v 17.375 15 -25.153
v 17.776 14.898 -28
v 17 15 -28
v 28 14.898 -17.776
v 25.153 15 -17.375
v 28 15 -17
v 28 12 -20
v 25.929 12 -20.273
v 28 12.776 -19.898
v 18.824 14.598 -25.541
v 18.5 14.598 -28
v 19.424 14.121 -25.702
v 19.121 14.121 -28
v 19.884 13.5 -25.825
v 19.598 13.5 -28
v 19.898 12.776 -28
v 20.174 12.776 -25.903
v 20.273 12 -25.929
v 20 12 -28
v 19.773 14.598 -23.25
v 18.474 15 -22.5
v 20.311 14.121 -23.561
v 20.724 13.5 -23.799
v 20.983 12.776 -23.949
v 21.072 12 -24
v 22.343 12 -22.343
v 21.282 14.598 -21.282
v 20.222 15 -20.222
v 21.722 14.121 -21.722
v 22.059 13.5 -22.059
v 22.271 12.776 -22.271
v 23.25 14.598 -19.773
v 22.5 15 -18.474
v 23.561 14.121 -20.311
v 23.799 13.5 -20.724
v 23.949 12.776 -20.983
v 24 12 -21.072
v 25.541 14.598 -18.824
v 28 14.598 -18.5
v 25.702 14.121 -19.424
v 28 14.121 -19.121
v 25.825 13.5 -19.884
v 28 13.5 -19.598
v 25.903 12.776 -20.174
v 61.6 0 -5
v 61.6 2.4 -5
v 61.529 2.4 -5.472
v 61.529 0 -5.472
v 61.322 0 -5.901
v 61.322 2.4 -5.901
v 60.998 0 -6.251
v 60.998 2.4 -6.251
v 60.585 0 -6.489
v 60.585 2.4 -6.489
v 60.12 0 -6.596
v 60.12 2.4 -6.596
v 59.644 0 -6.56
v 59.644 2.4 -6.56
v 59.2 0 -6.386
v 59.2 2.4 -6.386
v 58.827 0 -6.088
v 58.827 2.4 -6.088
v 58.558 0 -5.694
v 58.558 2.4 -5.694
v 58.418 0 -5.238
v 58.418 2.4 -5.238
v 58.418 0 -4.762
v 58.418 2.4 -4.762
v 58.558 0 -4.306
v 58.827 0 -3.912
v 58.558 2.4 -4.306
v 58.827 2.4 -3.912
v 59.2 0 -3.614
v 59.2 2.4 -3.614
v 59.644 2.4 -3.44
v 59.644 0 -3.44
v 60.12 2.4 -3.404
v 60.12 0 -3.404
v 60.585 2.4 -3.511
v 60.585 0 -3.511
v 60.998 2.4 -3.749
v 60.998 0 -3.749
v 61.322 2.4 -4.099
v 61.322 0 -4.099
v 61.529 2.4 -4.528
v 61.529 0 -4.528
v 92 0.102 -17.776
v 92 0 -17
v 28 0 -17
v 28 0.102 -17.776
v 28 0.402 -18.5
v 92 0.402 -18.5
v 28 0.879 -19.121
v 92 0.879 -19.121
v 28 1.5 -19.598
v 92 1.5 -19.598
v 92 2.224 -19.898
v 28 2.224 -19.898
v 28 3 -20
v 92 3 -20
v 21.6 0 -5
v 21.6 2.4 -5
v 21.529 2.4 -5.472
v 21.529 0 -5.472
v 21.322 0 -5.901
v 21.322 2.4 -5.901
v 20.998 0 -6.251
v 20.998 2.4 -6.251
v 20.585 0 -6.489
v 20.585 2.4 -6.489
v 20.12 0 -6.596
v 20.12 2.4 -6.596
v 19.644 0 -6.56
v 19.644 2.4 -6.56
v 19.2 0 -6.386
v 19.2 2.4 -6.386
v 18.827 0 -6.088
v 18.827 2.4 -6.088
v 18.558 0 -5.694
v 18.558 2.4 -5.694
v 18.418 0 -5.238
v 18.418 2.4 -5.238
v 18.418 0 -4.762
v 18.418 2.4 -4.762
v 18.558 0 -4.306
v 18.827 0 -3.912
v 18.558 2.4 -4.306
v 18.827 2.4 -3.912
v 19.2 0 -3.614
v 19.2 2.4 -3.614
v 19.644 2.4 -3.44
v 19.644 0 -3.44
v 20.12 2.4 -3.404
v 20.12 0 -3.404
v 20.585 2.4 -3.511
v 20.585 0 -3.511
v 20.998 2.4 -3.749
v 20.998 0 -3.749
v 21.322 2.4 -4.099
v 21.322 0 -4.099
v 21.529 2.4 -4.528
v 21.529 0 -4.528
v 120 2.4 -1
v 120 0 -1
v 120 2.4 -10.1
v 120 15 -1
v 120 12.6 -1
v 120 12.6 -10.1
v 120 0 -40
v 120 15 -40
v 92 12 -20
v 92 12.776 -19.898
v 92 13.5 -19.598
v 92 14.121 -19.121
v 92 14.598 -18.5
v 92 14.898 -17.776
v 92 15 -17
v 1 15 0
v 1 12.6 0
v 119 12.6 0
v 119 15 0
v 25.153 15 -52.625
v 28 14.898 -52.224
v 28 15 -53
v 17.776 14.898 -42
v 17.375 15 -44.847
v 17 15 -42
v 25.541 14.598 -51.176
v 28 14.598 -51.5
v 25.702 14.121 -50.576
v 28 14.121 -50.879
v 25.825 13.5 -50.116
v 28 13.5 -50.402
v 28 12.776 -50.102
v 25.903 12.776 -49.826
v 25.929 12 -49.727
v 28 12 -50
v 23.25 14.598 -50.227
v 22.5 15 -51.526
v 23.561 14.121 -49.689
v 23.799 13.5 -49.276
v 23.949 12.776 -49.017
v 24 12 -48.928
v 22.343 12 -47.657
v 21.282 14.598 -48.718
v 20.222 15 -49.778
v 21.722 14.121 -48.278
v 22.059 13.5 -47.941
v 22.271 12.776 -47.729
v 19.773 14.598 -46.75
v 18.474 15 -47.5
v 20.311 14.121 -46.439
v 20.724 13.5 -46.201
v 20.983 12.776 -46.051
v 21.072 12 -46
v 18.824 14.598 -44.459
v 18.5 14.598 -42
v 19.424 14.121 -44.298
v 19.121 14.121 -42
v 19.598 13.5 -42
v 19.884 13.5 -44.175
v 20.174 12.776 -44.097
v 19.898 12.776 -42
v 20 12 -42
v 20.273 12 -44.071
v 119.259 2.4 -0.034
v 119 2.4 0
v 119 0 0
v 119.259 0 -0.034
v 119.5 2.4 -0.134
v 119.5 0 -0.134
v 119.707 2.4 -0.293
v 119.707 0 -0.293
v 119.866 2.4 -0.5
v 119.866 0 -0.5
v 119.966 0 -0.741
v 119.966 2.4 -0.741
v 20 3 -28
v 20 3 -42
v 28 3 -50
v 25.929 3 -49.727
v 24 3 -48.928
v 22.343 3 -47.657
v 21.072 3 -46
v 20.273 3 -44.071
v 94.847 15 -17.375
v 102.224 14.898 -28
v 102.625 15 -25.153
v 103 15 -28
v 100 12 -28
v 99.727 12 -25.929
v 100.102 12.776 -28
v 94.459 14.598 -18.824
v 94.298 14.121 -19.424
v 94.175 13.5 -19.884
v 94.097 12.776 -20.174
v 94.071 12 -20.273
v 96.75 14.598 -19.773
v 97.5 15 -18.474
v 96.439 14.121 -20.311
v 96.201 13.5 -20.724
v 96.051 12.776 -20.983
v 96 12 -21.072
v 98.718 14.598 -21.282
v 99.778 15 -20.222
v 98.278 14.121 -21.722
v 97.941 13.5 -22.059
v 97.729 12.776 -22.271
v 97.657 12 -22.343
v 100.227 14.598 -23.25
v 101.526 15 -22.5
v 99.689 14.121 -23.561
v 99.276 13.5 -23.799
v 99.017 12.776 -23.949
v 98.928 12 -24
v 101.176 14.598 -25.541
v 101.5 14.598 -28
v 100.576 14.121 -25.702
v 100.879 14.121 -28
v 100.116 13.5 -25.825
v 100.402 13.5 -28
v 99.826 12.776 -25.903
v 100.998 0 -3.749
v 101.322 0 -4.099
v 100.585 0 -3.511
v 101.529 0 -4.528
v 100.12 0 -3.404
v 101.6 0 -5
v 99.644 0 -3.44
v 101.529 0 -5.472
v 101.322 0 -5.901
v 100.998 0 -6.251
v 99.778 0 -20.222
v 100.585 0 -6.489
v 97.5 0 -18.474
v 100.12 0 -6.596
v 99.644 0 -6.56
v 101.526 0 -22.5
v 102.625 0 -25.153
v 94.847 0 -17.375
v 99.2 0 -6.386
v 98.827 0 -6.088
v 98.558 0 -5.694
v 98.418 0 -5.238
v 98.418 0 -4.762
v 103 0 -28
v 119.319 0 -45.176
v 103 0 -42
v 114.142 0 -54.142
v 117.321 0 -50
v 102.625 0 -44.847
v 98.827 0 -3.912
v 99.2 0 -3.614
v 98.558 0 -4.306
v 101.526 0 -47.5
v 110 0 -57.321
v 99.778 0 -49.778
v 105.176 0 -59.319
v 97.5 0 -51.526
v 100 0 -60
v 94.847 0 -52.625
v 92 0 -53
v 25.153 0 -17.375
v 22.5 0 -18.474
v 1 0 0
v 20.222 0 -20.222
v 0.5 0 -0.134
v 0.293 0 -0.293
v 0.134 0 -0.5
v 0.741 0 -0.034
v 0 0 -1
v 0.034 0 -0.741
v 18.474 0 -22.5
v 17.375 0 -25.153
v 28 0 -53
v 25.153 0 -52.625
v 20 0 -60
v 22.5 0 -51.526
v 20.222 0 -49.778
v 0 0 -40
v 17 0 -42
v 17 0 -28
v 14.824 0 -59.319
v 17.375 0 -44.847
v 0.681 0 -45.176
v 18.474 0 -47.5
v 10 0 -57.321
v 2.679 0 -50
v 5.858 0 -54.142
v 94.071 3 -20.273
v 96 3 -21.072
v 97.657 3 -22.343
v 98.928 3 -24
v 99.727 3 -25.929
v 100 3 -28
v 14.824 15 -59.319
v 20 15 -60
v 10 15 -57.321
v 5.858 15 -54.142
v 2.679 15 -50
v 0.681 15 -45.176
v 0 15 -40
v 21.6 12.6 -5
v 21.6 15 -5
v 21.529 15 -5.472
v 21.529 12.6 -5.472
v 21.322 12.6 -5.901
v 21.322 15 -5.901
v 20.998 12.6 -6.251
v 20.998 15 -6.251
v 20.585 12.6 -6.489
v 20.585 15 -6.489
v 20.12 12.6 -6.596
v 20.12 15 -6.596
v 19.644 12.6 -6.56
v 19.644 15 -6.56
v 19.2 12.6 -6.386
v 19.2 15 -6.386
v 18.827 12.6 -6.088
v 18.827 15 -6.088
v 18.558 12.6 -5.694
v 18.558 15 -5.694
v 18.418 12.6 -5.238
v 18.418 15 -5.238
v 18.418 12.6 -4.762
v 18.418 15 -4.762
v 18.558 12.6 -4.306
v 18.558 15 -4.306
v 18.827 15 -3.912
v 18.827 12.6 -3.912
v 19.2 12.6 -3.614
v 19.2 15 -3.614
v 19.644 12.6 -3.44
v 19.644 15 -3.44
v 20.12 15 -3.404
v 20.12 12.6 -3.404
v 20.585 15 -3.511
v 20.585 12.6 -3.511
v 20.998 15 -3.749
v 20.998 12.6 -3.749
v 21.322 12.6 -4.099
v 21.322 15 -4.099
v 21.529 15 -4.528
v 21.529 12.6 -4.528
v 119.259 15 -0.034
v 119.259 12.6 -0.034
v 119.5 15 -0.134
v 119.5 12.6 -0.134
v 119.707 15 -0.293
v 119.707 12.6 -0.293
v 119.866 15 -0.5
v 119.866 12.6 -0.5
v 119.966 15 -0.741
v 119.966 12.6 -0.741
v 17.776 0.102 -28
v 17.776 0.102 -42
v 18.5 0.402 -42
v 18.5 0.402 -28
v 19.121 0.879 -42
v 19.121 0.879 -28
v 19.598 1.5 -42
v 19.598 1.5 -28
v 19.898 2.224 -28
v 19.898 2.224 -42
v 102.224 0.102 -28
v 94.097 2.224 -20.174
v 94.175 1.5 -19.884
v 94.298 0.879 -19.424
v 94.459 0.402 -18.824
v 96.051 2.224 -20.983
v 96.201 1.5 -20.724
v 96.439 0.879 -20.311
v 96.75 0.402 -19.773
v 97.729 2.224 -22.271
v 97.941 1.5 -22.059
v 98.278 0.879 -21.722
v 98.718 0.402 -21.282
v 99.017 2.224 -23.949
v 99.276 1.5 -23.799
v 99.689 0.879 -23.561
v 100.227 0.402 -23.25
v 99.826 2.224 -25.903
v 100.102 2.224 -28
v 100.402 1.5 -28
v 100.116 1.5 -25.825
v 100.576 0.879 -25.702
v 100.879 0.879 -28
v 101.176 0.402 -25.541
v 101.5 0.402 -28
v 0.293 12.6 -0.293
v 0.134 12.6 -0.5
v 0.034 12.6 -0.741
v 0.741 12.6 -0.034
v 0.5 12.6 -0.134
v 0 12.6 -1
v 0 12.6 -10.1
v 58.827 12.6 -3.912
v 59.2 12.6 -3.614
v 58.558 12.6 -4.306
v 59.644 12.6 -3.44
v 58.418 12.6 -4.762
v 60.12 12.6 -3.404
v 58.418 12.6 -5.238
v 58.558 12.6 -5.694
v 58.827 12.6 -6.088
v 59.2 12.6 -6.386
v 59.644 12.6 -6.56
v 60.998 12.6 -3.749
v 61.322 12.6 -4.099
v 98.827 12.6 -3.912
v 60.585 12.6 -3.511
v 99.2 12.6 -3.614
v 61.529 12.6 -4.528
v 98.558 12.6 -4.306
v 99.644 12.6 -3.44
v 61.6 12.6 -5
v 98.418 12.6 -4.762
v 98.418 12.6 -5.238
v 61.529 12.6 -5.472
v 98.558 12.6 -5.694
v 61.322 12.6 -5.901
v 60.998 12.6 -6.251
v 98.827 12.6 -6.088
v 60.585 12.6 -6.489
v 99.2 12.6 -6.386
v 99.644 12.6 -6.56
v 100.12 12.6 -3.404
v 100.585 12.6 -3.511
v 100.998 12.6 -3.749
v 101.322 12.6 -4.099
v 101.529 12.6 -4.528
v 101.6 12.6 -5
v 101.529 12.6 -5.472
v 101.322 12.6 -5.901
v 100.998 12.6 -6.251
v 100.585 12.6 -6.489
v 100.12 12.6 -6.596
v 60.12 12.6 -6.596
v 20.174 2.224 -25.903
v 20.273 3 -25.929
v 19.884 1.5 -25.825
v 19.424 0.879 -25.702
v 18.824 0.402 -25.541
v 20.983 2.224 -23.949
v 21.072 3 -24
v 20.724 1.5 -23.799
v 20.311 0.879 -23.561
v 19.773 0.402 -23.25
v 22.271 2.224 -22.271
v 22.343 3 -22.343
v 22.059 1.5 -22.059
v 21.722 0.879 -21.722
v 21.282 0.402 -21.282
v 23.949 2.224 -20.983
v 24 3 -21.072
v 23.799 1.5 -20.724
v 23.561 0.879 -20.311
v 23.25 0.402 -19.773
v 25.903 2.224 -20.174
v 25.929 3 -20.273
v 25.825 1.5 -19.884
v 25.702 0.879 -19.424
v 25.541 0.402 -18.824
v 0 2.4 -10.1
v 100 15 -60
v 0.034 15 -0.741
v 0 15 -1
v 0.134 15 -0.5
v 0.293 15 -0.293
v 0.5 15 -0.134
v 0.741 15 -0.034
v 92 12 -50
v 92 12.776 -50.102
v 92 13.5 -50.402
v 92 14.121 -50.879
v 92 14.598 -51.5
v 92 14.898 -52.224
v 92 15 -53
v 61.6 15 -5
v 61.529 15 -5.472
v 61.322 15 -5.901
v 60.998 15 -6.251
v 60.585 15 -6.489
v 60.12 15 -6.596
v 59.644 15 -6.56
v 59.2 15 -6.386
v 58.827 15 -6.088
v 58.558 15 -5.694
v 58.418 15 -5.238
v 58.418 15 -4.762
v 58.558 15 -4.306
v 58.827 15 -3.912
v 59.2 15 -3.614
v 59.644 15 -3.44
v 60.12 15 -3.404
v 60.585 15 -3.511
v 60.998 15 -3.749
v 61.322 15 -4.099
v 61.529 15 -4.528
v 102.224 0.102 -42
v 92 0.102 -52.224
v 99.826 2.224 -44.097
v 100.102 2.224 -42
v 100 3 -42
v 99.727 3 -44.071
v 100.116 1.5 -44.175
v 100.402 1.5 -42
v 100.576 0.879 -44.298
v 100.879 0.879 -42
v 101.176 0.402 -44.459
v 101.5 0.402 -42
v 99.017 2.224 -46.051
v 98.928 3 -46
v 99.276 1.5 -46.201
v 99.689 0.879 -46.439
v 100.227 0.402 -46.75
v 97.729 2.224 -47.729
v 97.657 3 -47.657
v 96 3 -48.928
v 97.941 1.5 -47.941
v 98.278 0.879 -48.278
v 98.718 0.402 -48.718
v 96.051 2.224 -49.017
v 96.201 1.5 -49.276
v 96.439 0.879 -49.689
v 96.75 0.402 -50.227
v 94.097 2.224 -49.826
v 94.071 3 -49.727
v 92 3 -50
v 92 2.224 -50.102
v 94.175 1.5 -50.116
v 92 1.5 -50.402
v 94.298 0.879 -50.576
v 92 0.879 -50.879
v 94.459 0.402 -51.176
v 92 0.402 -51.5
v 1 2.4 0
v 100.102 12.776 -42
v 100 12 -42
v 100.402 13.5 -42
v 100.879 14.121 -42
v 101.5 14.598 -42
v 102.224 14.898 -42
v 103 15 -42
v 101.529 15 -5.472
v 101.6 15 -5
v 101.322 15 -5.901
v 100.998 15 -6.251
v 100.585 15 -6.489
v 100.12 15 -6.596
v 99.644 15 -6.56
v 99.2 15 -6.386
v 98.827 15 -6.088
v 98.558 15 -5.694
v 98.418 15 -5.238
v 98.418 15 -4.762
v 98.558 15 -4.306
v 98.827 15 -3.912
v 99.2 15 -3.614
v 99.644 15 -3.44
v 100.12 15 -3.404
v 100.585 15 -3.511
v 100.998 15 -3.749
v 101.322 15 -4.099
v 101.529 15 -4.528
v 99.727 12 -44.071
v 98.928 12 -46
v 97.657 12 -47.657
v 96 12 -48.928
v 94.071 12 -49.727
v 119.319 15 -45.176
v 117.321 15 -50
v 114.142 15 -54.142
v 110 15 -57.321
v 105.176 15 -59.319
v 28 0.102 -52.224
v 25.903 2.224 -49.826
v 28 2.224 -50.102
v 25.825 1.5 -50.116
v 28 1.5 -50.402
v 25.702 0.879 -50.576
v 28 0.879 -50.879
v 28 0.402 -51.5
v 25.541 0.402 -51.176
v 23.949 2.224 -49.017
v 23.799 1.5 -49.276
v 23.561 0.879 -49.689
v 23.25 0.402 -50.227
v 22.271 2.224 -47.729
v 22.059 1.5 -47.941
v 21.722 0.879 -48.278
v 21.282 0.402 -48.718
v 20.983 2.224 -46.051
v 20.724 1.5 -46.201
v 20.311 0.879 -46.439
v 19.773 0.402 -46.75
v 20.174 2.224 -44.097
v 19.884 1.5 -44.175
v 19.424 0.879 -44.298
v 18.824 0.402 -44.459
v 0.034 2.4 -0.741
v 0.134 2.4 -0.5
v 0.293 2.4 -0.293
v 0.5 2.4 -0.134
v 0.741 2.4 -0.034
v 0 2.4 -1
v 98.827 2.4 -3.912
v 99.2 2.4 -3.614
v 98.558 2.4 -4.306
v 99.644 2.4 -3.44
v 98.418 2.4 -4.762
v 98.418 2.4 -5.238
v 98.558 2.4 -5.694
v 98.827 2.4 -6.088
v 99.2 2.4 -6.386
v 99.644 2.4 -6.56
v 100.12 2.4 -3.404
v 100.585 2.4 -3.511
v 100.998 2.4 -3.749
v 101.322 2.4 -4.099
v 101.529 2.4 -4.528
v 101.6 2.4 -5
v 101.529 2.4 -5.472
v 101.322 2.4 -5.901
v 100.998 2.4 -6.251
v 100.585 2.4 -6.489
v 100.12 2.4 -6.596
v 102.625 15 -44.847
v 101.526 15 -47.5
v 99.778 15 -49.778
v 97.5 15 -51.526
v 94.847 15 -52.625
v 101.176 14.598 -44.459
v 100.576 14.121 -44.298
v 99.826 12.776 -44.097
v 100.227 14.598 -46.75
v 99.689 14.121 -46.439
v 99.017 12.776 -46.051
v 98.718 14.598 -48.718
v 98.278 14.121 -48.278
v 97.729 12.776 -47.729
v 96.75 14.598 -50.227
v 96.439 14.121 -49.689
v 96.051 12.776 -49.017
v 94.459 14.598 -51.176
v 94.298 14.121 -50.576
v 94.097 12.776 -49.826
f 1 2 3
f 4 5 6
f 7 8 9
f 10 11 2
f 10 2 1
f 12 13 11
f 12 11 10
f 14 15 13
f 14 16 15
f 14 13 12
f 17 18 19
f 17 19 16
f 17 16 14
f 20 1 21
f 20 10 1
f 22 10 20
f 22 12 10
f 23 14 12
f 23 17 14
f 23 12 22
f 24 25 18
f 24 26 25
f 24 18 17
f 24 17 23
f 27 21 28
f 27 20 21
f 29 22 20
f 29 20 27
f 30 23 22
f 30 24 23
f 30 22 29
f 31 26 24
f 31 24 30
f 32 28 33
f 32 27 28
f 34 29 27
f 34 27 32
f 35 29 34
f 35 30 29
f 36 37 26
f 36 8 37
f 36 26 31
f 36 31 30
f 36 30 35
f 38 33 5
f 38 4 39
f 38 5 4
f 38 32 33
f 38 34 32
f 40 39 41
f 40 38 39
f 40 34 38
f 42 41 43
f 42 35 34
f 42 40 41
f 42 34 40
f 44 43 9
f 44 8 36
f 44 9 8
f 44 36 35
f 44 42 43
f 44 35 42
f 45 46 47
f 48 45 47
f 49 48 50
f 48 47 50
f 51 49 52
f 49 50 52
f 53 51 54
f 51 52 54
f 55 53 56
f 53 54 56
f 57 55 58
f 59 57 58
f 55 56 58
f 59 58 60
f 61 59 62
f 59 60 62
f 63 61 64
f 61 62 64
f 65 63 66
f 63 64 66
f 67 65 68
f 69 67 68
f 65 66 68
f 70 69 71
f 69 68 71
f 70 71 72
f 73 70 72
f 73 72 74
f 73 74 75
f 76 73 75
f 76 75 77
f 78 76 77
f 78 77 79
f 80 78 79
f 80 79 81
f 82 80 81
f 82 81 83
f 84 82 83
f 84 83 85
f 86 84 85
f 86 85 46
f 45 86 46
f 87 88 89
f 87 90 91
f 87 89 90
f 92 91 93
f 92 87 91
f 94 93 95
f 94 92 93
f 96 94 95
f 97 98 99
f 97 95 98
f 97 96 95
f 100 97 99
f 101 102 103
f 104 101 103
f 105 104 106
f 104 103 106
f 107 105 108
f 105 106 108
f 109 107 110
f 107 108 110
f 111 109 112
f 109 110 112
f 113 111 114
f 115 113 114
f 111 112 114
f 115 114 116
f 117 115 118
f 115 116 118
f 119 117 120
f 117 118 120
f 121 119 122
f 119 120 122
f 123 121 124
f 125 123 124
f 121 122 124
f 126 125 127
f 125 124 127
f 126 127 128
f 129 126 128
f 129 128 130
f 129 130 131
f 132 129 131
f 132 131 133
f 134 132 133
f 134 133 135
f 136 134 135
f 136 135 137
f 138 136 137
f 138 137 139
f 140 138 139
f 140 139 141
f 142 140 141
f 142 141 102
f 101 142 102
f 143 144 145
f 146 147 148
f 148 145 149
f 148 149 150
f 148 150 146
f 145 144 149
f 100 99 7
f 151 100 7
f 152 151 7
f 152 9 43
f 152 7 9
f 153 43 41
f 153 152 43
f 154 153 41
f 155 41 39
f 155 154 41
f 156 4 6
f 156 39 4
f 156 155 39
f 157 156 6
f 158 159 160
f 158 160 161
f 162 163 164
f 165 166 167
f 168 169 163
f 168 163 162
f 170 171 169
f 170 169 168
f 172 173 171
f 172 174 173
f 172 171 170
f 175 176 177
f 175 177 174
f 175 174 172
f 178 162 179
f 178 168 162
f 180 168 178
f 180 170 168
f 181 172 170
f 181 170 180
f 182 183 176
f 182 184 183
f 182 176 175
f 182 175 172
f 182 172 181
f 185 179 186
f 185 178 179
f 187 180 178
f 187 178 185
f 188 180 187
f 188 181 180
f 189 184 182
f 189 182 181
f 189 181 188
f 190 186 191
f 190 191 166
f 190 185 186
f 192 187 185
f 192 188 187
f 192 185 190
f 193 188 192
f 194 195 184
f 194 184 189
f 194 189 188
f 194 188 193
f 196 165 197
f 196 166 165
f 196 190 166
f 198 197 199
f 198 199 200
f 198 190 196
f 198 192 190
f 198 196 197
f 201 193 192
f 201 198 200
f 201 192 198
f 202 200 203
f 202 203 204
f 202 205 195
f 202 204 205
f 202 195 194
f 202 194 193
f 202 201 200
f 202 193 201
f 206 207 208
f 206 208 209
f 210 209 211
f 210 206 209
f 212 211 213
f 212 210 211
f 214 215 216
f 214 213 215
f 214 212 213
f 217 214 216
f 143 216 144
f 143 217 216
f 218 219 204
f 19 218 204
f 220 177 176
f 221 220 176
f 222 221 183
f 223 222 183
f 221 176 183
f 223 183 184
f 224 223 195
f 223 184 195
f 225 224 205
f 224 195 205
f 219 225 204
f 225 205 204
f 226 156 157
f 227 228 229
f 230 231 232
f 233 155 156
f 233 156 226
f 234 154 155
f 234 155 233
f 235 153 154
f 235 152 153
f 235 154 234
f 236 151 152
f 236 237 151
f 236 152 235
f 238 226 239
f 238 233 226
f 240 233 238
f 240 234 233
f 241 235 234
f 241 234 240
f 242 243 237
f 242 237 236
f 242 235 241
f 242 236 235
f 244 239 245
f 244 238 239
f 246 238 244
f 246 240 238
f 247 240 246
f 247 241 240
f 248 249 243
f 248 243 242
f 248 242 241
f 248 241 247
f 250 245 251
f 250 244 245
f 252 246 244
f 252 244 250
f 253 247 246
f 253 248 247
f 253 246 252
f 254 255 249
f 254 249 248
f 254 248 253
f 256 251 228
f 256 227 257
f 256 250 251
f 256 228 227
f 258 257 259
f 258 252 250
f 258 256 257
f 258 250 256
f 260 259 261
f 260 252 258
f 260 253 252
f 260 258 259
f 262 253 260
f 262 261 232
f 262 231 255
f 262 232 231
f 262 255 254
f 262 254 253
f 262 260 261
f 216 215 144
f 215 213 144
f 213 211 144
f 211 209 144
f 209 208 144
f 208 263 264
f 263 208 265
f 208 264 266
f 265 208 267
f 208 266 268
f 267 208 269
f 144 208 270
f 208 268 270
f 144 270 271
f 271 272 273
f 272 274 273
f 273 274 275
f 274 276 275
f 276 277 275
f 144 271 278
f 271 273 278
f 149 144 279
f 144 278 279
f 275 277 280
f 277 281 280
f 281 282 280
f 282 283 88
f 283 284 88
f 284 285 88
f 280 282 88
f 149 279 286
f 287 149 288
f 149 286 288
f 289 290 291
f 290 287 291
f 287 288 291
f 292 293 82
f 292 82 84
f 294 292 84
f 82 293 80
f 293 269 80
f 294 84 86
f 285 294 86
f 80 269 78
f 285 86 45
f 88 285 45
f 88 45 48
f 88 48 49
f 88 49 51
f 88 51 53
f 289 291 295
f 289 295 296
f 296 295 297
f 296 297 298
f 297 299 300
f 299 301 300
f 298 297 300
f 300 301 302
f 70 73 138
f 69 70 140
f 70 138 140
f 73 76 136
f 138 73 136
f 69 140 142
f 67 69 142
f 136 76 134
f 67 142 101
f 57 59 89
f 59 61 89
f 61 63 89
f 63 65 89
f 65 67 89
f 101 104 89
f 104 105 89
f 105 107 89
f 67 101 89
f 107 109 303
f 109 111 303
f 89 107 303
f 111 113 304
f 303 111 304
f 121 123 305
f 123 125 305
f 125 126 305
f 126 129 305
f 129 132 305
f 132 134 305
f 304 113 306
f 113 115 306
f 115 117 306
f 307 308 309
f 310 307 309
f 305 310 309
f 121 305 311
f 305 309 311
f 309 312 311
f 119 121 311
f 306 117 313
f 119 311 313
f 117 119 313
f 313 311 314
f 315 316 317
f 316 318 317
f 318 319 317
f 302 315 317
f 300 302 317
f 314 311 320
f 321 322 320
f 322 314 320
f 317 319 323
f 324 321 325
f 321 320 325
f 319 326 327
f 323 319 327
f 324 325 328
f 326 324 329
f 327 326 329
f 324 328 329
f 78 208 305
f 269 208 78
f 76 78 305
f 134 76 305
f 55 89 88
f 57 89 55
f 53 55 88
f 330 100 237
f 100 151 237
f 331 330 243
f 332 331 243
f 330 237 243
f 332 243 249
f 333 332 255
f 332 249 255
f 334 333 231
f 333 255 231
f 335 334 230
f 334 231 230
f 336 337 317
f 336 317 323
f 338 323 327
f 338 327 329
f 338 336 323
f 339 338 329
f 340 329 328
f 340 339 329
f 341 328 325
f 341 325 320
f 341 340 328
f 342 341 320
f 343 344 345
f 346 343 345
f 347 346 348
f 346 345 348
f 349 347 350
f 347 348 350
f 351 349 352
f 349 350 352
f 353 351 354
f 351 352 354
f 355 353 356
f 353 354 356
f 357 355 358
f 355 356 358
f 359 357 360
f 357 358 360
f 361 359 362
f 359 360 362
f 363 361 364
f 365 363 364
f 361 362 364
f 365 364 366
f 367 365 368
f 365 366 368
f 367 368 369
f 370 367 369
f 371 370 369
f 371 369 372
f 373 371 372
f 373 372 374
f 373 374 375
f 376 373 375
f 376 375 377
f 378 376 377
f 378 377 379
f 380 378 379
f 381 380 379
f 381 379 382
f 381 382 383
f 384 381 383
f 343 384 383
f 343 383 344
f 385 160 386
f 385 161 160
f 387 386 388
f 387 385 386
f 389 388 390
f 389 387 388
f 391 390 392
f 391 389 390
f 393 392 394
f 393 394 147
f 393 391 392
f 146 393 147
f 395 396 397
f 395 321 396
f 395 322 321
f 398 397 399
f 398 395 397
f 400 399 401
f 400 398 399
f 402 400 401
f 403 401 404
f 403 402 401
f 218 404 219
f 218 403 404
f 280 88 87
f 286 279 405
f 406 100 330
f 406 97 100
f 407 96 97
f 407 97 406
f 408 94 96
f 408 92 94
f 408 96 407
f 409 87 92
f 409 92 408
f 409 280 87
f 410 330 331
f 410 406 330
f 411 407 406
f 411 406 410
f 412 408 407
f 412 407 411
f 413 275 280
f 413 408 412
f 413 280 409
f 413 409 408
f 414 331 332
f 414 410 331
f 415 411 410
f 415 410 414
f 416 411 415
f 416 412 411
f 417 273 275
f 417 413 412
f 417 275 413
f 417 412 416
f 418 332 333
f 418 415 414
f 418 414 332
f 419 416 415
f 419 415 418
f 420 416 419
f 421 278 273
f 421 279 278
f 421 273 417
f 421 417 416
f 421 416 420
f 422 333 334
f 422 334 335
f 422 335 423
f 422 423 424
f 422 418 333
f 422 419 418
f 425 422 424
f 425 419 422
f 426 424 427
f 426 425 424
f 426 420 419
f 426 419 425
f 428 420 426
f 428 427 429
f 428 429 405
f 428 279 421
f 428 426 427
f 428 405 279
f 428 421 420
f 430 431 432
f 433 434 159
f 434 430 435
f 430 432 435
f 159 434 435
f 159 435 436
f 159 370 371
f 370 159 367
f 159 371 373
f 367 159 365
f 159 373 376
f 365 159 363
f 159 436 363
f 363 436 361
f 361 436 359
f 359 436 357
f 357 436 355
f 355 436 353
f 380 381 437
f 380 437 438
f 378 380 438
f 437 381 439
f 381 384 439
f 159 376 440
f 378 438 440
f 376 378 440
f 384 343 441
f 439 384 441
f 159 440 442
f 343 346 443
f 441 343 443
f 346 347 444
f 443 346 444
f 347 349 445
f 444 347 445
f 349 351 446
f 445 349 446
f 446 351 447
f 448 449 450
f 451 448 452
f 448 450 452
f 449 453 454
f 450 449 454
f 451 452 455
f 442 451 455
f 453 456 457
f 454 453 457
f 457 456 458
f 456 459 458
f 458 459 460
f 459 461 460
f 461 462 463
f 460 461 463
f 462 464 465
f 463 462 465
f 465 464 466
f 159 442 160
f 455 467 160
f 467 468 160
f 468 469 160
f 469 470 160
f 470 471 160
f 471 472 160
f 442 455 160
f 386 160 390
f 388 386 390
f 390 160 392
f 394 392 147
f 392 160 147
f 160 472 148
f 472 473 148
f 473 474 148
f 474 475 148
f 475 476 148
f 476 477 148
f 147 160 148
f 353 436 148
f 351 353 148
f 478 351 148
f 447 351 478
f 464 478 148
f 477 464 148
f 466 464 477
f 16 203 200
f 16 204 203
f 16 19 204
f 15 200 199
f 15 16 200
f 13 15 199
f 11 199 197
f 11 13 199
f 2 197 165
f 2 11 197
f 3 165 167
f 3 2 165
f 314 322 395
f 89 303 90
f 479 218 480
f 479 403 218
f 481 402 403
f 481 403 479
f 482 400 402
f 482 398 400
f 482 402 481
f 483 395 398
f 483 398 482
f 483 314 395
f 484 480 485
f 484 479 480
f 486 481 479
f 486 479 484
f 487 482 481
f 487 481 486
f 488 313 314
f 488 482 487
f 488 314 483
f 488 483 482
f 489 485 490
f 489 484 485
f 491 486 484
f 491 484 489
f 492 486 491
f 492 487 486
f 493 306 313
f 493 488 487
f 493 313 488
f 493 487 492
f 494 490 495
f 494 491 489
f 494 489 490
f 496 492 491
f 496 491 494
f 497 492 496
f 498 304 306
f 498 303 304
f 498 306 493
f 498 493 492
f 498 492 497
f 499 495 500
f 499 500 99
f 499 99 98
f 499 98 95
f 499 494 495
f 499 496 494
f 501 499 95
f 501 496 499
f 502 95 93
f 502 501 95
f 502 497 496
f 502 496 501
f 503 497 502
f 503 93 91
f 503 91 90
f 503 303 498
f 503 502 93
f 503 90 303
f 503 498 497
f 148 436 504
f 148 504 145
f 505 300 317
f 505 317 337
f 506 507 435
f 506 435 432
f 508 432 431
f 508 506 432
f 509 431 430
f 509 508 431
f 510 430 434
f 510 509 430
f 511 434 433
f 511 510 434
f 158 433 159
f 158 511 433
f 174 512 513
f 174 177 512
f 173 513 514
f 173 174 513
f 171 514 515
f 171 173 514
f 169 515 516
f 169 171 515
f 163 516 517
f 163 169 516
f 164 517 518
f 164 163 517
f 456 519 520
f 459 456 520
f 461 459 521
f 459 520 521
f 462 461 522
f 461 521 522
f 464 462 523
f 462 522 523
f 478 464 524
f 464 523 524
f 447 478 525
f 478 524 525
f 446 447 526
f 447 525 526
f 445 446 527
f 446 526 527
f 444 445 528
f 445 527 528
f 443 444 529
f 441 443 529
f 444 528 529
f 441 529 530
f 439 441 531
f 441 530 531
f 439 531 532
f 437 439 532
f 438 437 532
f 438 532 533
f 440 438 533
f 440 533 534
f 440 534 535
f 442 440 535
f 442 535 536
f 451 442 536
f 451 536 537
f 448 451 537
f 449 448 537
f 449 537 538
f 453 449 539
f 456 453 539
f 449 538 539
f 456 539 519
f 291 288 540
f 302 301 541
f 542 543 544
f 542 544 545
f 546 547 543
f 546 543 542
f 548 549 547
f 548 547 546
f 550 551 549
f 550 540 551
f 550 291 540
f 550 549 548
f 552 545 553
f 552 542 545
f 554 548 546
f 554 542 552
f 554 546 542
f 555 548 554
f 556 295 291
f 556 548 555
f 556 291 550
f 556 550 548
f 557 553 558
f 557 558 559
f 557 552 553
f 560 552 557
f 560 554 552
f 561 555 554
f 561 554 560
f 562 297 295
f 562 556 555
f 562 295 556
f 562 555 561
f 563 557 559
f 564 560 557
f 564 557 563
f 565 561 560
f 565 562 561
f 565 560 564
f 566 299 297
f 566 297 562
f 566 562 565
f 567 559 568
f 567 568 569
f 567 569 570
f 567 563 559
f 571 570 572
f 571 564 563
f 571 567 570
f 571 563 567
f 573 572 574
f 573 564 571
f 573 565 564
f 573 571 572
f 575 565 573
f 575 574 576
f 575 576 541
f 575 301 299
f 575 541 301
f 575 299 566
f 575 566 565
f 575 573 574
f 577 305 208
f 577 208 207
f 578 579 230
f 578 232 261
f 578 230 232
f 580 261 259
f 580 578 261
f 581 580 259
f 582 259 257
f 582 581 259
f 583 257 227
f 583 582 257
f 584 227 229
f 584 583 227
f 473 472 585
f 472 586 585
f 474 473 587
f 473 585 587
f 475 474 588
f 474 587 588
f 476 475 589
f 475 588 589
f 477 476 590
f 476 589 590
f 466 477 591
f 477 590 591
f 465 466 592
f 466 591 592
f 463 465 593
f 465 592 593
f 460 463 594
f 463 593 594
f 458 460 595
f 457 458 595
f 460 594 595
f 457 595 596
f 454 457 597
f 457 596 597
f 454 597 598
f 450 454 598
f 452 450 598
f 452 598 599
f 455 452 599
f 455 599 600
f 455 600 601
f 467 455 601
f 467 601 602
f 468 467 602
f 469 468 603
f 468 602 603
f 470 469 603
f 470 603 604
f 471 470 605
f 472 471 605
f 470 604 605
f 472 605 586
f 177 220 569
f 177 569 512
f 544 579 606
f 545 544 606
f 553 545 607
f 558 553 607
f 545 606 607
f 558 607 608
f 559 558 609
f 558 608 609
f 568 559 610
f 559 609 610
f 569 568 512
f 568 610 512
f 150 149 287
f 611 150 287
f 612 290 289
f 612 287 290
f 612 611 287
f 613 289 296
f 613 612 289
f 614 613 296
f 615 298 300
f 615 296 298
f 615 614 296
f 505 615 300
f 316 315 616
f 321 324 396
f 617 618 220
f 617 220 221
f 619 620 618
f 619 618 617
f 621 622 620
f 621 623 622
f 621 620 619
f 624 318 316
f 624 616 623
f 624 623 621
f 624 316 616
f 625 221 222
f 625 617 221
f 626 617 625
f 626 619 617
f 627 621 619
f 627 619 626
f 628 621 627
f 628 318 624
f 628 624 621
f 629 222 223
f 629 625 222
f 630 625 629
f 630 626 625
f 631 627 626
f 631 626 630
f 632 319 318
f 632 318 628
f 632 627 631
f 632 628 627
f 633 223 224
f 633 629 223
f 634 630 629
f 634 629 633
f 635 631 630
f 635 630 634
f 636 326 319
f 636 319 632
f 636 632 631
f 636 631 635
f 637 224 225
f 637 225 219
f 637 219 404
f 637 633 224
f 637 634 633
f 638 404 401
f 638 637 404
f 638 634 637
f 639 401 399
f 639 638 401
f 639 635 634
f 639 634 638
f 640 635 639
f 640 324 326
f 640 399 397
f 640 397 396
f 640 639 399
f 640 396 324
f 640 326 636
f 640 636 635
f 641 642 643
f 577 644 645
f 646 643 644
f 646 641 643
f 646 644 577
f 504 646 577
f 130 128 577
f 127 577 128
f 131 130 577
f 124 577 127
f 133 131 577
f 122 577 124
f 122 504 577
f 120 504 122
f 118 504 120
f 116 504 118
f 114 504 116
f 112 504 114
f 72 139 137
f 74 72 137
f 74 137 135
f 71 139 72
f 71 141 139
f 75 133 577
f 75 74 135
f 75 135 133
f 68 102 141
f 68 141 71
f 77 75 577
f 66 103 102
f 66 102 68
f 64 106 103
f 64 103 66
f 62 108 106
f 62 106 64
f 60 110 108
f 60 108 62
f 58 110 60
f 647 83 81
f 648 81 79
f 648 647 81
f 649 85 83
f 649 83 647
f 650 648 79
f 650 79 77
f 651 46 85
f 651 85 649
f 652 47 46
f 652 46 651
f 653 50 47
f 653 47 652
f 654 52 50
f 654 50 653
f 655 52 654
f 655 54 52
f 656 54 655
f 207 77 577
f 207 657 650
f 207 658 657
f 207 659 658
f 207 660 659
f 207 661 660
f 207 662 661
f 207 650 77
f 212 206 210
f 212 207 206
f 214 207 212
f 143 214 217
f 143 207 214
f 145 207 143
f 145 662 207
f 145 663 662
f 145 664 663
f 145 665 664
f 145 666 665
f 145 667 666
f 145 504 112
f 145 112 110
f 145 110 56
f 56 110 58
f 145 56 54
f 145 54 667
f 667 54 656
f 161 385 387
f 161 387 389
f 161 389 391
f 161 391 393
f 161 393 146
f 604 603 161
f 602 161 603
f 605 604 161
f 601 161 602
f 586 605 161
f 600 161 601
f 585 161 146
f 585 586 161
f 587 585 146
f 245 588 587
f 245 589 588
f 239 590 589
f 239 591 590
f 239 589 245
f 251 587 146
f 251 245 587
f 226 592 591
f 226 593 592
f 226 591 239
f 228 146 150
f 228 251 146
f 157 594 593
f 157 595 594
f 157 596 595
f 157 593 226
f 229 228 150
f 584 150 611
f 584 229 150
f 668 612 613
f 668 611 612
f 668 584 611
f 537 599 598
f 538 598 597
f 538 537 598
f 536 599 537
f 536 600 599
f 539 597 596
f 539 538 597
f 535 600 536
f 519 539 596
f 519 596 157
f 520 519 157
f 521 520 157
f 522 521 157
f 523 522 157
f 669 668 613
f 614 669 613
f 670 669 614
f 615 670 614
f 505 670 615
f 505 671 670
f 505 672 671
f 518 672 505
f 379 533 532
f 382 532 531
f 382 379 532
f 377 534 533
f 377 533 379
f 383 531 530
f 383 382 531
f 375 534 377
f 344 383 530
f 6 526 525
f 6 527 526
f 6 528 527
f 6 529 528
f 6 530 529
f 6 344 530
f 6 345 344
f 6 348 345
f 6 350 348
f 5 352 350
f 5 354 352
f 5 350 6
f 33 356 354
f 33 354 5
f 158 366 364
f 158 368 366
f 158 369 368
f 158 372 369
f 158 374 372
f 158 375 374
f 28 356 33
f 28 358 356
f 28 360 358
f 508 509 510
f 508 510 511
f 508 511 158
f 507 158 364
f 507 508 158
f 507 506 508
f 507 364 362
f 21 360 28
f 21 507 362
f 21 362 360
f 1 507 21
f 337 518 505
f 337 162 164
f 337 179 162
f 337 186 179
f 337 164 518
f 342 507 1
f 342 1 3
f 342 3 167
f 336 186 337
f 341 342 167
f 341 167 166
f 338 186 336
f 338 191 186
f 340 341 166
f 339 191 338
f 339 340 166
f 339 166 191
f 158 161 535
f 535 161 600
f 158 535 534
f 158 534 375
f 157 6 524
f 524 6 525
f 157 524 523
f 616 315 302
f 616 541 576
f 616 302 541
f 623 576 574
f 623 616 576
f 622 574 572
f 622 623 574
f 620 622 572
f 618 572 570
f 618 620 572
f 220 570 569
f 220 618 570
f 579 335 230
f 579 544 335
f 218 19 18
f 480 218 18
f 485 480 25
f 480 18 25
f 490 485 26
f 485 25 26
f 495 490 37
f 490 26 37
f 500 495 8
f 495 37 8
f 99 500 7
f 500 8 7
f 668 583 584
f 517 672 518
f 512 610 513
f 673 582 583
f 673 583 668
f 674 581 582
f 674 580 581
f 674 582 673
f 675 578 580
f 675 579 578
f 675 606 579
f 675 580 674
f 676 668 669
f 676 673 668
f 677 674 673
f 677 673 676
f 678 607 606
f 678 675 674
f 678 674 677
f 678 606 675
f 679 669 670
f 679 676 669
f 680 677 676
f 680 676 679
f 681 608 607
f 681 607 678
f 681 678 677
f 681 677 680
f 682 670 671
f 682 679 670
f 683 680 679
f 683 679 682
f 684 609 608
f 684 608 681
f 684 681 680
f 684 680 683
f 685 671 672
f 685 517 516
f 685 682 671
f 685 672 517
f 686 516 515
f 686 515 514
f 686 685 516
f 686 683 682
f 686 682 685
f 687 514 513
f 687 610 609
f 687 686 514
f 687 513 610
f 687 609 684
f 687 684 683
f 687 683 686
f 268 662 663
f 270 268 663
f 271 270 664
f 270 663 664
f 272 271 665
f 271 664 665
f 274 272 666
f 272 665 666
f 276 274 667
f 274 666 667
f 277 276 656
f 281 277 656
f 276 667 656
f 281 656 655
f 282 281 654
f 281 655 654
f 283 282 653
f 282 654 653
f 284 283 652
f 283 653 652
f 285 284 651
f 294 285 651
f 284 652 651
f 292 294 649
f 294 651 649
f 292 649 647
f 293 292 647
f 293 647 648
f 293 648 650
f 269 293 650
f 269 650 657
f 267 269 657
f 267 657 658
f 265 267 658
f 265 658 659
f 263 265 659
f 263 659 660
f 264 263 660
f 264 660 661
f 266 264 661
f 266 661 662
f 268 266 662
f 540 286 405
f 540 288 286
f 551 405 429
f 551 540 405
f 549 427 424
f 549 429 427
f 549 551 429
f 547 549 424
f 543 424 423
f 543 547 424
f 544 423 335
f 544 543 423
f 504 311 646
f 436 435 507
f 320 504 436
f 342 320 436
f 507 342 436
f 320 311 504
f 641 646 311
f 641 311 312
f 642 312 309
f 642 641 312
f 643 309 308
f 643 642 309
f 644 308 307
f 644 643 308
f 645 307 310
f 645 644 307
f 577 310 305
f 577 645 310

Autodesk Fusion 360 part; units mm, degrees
box "BoxPrimitive1" add length 60 width 120 height 15 placed x (0, 0, -1) y (-1, 0, 0) z (0, 1, 0) at (120, 0, 0)
fillet "Fillet1" radius 20 1 edges at (0, 7.5, -60)
fillet "Fillet1" radius 20 1 edges at (120, 7.5, -60)
box "BoxPrimitive2" cut length 10.2 width 10.1 height -120 placed x (0, 1, 0) y (0, 0, 1) z (1, 0, 0) at (120, 2.4, -10.1)
box "BoxPrimitive3" cut length 30 width 80 height -60 placed x (0, 0, -1) y (-1, 0, 0) z (0, 1, 0) at (100, 15, -20)
fillet "Fillet2" radius 8 1 edges at (20, 7.5, -50)
fillet "Fillet2" radius 8 1 edges at (100, 7.5, -50)
fillet "Fillet2" radius 8 1 edges at (100, 7.5, -20)
fillet "Fillet2" radius 8 1 edges at (20, 7.5, -20)
cylinder "CylinderPrimitive1" cut diameter 3.2 height -15 placed x (1, 0, 0) y (0, 0, -1) z (0, 1, 0) at (60, 15, -5)
cylinder "CylinderPrimitive2" cut diameter 3.2 height -15 placed x (1, 0, 0) y (0, 0, -1) z (0, 1, 0) at (20, 15, -5)
cylinder "CylinderPrimitive3" cut diameter 3.2 height -15 placed x (1, 0, 0) y (0, 0, -1) z (0, 1, 0) at (100, 15, -5)
fillet "Fillet3" radius 3 8 edges at (60, 15, -50) (22.3431, 15, -47.6569) (20, 15, -35) (22.3431, 15, -22.3431) (60, 15, -20) (97.6569, 15, -22.3431) (100, 15, -35) (97.6569, 15, -47.6569)
fillet "Fillet3" radius 3 8 edges at (97.6569, 0, -47.6569) (60, 0, -50) (22.3431, 0, -47.6569) (20, 0, -35) (22.3431, 0, -22.3431) (60, 0, -20) (97.6569, 0, -22.3431) (100, 0, -35)
fillet "Fillet4" radius 1 1 edges at (120, 13.8, 0)
fillet "Fillet4" radius 1 1 edges at (120, 1.2, 0)
fillet "Fillet4" radius 1 1 edges at (0, 13.8, 0)
fillet "Fillet4" radius 1 1 edges at (0, 1.2, 0)
